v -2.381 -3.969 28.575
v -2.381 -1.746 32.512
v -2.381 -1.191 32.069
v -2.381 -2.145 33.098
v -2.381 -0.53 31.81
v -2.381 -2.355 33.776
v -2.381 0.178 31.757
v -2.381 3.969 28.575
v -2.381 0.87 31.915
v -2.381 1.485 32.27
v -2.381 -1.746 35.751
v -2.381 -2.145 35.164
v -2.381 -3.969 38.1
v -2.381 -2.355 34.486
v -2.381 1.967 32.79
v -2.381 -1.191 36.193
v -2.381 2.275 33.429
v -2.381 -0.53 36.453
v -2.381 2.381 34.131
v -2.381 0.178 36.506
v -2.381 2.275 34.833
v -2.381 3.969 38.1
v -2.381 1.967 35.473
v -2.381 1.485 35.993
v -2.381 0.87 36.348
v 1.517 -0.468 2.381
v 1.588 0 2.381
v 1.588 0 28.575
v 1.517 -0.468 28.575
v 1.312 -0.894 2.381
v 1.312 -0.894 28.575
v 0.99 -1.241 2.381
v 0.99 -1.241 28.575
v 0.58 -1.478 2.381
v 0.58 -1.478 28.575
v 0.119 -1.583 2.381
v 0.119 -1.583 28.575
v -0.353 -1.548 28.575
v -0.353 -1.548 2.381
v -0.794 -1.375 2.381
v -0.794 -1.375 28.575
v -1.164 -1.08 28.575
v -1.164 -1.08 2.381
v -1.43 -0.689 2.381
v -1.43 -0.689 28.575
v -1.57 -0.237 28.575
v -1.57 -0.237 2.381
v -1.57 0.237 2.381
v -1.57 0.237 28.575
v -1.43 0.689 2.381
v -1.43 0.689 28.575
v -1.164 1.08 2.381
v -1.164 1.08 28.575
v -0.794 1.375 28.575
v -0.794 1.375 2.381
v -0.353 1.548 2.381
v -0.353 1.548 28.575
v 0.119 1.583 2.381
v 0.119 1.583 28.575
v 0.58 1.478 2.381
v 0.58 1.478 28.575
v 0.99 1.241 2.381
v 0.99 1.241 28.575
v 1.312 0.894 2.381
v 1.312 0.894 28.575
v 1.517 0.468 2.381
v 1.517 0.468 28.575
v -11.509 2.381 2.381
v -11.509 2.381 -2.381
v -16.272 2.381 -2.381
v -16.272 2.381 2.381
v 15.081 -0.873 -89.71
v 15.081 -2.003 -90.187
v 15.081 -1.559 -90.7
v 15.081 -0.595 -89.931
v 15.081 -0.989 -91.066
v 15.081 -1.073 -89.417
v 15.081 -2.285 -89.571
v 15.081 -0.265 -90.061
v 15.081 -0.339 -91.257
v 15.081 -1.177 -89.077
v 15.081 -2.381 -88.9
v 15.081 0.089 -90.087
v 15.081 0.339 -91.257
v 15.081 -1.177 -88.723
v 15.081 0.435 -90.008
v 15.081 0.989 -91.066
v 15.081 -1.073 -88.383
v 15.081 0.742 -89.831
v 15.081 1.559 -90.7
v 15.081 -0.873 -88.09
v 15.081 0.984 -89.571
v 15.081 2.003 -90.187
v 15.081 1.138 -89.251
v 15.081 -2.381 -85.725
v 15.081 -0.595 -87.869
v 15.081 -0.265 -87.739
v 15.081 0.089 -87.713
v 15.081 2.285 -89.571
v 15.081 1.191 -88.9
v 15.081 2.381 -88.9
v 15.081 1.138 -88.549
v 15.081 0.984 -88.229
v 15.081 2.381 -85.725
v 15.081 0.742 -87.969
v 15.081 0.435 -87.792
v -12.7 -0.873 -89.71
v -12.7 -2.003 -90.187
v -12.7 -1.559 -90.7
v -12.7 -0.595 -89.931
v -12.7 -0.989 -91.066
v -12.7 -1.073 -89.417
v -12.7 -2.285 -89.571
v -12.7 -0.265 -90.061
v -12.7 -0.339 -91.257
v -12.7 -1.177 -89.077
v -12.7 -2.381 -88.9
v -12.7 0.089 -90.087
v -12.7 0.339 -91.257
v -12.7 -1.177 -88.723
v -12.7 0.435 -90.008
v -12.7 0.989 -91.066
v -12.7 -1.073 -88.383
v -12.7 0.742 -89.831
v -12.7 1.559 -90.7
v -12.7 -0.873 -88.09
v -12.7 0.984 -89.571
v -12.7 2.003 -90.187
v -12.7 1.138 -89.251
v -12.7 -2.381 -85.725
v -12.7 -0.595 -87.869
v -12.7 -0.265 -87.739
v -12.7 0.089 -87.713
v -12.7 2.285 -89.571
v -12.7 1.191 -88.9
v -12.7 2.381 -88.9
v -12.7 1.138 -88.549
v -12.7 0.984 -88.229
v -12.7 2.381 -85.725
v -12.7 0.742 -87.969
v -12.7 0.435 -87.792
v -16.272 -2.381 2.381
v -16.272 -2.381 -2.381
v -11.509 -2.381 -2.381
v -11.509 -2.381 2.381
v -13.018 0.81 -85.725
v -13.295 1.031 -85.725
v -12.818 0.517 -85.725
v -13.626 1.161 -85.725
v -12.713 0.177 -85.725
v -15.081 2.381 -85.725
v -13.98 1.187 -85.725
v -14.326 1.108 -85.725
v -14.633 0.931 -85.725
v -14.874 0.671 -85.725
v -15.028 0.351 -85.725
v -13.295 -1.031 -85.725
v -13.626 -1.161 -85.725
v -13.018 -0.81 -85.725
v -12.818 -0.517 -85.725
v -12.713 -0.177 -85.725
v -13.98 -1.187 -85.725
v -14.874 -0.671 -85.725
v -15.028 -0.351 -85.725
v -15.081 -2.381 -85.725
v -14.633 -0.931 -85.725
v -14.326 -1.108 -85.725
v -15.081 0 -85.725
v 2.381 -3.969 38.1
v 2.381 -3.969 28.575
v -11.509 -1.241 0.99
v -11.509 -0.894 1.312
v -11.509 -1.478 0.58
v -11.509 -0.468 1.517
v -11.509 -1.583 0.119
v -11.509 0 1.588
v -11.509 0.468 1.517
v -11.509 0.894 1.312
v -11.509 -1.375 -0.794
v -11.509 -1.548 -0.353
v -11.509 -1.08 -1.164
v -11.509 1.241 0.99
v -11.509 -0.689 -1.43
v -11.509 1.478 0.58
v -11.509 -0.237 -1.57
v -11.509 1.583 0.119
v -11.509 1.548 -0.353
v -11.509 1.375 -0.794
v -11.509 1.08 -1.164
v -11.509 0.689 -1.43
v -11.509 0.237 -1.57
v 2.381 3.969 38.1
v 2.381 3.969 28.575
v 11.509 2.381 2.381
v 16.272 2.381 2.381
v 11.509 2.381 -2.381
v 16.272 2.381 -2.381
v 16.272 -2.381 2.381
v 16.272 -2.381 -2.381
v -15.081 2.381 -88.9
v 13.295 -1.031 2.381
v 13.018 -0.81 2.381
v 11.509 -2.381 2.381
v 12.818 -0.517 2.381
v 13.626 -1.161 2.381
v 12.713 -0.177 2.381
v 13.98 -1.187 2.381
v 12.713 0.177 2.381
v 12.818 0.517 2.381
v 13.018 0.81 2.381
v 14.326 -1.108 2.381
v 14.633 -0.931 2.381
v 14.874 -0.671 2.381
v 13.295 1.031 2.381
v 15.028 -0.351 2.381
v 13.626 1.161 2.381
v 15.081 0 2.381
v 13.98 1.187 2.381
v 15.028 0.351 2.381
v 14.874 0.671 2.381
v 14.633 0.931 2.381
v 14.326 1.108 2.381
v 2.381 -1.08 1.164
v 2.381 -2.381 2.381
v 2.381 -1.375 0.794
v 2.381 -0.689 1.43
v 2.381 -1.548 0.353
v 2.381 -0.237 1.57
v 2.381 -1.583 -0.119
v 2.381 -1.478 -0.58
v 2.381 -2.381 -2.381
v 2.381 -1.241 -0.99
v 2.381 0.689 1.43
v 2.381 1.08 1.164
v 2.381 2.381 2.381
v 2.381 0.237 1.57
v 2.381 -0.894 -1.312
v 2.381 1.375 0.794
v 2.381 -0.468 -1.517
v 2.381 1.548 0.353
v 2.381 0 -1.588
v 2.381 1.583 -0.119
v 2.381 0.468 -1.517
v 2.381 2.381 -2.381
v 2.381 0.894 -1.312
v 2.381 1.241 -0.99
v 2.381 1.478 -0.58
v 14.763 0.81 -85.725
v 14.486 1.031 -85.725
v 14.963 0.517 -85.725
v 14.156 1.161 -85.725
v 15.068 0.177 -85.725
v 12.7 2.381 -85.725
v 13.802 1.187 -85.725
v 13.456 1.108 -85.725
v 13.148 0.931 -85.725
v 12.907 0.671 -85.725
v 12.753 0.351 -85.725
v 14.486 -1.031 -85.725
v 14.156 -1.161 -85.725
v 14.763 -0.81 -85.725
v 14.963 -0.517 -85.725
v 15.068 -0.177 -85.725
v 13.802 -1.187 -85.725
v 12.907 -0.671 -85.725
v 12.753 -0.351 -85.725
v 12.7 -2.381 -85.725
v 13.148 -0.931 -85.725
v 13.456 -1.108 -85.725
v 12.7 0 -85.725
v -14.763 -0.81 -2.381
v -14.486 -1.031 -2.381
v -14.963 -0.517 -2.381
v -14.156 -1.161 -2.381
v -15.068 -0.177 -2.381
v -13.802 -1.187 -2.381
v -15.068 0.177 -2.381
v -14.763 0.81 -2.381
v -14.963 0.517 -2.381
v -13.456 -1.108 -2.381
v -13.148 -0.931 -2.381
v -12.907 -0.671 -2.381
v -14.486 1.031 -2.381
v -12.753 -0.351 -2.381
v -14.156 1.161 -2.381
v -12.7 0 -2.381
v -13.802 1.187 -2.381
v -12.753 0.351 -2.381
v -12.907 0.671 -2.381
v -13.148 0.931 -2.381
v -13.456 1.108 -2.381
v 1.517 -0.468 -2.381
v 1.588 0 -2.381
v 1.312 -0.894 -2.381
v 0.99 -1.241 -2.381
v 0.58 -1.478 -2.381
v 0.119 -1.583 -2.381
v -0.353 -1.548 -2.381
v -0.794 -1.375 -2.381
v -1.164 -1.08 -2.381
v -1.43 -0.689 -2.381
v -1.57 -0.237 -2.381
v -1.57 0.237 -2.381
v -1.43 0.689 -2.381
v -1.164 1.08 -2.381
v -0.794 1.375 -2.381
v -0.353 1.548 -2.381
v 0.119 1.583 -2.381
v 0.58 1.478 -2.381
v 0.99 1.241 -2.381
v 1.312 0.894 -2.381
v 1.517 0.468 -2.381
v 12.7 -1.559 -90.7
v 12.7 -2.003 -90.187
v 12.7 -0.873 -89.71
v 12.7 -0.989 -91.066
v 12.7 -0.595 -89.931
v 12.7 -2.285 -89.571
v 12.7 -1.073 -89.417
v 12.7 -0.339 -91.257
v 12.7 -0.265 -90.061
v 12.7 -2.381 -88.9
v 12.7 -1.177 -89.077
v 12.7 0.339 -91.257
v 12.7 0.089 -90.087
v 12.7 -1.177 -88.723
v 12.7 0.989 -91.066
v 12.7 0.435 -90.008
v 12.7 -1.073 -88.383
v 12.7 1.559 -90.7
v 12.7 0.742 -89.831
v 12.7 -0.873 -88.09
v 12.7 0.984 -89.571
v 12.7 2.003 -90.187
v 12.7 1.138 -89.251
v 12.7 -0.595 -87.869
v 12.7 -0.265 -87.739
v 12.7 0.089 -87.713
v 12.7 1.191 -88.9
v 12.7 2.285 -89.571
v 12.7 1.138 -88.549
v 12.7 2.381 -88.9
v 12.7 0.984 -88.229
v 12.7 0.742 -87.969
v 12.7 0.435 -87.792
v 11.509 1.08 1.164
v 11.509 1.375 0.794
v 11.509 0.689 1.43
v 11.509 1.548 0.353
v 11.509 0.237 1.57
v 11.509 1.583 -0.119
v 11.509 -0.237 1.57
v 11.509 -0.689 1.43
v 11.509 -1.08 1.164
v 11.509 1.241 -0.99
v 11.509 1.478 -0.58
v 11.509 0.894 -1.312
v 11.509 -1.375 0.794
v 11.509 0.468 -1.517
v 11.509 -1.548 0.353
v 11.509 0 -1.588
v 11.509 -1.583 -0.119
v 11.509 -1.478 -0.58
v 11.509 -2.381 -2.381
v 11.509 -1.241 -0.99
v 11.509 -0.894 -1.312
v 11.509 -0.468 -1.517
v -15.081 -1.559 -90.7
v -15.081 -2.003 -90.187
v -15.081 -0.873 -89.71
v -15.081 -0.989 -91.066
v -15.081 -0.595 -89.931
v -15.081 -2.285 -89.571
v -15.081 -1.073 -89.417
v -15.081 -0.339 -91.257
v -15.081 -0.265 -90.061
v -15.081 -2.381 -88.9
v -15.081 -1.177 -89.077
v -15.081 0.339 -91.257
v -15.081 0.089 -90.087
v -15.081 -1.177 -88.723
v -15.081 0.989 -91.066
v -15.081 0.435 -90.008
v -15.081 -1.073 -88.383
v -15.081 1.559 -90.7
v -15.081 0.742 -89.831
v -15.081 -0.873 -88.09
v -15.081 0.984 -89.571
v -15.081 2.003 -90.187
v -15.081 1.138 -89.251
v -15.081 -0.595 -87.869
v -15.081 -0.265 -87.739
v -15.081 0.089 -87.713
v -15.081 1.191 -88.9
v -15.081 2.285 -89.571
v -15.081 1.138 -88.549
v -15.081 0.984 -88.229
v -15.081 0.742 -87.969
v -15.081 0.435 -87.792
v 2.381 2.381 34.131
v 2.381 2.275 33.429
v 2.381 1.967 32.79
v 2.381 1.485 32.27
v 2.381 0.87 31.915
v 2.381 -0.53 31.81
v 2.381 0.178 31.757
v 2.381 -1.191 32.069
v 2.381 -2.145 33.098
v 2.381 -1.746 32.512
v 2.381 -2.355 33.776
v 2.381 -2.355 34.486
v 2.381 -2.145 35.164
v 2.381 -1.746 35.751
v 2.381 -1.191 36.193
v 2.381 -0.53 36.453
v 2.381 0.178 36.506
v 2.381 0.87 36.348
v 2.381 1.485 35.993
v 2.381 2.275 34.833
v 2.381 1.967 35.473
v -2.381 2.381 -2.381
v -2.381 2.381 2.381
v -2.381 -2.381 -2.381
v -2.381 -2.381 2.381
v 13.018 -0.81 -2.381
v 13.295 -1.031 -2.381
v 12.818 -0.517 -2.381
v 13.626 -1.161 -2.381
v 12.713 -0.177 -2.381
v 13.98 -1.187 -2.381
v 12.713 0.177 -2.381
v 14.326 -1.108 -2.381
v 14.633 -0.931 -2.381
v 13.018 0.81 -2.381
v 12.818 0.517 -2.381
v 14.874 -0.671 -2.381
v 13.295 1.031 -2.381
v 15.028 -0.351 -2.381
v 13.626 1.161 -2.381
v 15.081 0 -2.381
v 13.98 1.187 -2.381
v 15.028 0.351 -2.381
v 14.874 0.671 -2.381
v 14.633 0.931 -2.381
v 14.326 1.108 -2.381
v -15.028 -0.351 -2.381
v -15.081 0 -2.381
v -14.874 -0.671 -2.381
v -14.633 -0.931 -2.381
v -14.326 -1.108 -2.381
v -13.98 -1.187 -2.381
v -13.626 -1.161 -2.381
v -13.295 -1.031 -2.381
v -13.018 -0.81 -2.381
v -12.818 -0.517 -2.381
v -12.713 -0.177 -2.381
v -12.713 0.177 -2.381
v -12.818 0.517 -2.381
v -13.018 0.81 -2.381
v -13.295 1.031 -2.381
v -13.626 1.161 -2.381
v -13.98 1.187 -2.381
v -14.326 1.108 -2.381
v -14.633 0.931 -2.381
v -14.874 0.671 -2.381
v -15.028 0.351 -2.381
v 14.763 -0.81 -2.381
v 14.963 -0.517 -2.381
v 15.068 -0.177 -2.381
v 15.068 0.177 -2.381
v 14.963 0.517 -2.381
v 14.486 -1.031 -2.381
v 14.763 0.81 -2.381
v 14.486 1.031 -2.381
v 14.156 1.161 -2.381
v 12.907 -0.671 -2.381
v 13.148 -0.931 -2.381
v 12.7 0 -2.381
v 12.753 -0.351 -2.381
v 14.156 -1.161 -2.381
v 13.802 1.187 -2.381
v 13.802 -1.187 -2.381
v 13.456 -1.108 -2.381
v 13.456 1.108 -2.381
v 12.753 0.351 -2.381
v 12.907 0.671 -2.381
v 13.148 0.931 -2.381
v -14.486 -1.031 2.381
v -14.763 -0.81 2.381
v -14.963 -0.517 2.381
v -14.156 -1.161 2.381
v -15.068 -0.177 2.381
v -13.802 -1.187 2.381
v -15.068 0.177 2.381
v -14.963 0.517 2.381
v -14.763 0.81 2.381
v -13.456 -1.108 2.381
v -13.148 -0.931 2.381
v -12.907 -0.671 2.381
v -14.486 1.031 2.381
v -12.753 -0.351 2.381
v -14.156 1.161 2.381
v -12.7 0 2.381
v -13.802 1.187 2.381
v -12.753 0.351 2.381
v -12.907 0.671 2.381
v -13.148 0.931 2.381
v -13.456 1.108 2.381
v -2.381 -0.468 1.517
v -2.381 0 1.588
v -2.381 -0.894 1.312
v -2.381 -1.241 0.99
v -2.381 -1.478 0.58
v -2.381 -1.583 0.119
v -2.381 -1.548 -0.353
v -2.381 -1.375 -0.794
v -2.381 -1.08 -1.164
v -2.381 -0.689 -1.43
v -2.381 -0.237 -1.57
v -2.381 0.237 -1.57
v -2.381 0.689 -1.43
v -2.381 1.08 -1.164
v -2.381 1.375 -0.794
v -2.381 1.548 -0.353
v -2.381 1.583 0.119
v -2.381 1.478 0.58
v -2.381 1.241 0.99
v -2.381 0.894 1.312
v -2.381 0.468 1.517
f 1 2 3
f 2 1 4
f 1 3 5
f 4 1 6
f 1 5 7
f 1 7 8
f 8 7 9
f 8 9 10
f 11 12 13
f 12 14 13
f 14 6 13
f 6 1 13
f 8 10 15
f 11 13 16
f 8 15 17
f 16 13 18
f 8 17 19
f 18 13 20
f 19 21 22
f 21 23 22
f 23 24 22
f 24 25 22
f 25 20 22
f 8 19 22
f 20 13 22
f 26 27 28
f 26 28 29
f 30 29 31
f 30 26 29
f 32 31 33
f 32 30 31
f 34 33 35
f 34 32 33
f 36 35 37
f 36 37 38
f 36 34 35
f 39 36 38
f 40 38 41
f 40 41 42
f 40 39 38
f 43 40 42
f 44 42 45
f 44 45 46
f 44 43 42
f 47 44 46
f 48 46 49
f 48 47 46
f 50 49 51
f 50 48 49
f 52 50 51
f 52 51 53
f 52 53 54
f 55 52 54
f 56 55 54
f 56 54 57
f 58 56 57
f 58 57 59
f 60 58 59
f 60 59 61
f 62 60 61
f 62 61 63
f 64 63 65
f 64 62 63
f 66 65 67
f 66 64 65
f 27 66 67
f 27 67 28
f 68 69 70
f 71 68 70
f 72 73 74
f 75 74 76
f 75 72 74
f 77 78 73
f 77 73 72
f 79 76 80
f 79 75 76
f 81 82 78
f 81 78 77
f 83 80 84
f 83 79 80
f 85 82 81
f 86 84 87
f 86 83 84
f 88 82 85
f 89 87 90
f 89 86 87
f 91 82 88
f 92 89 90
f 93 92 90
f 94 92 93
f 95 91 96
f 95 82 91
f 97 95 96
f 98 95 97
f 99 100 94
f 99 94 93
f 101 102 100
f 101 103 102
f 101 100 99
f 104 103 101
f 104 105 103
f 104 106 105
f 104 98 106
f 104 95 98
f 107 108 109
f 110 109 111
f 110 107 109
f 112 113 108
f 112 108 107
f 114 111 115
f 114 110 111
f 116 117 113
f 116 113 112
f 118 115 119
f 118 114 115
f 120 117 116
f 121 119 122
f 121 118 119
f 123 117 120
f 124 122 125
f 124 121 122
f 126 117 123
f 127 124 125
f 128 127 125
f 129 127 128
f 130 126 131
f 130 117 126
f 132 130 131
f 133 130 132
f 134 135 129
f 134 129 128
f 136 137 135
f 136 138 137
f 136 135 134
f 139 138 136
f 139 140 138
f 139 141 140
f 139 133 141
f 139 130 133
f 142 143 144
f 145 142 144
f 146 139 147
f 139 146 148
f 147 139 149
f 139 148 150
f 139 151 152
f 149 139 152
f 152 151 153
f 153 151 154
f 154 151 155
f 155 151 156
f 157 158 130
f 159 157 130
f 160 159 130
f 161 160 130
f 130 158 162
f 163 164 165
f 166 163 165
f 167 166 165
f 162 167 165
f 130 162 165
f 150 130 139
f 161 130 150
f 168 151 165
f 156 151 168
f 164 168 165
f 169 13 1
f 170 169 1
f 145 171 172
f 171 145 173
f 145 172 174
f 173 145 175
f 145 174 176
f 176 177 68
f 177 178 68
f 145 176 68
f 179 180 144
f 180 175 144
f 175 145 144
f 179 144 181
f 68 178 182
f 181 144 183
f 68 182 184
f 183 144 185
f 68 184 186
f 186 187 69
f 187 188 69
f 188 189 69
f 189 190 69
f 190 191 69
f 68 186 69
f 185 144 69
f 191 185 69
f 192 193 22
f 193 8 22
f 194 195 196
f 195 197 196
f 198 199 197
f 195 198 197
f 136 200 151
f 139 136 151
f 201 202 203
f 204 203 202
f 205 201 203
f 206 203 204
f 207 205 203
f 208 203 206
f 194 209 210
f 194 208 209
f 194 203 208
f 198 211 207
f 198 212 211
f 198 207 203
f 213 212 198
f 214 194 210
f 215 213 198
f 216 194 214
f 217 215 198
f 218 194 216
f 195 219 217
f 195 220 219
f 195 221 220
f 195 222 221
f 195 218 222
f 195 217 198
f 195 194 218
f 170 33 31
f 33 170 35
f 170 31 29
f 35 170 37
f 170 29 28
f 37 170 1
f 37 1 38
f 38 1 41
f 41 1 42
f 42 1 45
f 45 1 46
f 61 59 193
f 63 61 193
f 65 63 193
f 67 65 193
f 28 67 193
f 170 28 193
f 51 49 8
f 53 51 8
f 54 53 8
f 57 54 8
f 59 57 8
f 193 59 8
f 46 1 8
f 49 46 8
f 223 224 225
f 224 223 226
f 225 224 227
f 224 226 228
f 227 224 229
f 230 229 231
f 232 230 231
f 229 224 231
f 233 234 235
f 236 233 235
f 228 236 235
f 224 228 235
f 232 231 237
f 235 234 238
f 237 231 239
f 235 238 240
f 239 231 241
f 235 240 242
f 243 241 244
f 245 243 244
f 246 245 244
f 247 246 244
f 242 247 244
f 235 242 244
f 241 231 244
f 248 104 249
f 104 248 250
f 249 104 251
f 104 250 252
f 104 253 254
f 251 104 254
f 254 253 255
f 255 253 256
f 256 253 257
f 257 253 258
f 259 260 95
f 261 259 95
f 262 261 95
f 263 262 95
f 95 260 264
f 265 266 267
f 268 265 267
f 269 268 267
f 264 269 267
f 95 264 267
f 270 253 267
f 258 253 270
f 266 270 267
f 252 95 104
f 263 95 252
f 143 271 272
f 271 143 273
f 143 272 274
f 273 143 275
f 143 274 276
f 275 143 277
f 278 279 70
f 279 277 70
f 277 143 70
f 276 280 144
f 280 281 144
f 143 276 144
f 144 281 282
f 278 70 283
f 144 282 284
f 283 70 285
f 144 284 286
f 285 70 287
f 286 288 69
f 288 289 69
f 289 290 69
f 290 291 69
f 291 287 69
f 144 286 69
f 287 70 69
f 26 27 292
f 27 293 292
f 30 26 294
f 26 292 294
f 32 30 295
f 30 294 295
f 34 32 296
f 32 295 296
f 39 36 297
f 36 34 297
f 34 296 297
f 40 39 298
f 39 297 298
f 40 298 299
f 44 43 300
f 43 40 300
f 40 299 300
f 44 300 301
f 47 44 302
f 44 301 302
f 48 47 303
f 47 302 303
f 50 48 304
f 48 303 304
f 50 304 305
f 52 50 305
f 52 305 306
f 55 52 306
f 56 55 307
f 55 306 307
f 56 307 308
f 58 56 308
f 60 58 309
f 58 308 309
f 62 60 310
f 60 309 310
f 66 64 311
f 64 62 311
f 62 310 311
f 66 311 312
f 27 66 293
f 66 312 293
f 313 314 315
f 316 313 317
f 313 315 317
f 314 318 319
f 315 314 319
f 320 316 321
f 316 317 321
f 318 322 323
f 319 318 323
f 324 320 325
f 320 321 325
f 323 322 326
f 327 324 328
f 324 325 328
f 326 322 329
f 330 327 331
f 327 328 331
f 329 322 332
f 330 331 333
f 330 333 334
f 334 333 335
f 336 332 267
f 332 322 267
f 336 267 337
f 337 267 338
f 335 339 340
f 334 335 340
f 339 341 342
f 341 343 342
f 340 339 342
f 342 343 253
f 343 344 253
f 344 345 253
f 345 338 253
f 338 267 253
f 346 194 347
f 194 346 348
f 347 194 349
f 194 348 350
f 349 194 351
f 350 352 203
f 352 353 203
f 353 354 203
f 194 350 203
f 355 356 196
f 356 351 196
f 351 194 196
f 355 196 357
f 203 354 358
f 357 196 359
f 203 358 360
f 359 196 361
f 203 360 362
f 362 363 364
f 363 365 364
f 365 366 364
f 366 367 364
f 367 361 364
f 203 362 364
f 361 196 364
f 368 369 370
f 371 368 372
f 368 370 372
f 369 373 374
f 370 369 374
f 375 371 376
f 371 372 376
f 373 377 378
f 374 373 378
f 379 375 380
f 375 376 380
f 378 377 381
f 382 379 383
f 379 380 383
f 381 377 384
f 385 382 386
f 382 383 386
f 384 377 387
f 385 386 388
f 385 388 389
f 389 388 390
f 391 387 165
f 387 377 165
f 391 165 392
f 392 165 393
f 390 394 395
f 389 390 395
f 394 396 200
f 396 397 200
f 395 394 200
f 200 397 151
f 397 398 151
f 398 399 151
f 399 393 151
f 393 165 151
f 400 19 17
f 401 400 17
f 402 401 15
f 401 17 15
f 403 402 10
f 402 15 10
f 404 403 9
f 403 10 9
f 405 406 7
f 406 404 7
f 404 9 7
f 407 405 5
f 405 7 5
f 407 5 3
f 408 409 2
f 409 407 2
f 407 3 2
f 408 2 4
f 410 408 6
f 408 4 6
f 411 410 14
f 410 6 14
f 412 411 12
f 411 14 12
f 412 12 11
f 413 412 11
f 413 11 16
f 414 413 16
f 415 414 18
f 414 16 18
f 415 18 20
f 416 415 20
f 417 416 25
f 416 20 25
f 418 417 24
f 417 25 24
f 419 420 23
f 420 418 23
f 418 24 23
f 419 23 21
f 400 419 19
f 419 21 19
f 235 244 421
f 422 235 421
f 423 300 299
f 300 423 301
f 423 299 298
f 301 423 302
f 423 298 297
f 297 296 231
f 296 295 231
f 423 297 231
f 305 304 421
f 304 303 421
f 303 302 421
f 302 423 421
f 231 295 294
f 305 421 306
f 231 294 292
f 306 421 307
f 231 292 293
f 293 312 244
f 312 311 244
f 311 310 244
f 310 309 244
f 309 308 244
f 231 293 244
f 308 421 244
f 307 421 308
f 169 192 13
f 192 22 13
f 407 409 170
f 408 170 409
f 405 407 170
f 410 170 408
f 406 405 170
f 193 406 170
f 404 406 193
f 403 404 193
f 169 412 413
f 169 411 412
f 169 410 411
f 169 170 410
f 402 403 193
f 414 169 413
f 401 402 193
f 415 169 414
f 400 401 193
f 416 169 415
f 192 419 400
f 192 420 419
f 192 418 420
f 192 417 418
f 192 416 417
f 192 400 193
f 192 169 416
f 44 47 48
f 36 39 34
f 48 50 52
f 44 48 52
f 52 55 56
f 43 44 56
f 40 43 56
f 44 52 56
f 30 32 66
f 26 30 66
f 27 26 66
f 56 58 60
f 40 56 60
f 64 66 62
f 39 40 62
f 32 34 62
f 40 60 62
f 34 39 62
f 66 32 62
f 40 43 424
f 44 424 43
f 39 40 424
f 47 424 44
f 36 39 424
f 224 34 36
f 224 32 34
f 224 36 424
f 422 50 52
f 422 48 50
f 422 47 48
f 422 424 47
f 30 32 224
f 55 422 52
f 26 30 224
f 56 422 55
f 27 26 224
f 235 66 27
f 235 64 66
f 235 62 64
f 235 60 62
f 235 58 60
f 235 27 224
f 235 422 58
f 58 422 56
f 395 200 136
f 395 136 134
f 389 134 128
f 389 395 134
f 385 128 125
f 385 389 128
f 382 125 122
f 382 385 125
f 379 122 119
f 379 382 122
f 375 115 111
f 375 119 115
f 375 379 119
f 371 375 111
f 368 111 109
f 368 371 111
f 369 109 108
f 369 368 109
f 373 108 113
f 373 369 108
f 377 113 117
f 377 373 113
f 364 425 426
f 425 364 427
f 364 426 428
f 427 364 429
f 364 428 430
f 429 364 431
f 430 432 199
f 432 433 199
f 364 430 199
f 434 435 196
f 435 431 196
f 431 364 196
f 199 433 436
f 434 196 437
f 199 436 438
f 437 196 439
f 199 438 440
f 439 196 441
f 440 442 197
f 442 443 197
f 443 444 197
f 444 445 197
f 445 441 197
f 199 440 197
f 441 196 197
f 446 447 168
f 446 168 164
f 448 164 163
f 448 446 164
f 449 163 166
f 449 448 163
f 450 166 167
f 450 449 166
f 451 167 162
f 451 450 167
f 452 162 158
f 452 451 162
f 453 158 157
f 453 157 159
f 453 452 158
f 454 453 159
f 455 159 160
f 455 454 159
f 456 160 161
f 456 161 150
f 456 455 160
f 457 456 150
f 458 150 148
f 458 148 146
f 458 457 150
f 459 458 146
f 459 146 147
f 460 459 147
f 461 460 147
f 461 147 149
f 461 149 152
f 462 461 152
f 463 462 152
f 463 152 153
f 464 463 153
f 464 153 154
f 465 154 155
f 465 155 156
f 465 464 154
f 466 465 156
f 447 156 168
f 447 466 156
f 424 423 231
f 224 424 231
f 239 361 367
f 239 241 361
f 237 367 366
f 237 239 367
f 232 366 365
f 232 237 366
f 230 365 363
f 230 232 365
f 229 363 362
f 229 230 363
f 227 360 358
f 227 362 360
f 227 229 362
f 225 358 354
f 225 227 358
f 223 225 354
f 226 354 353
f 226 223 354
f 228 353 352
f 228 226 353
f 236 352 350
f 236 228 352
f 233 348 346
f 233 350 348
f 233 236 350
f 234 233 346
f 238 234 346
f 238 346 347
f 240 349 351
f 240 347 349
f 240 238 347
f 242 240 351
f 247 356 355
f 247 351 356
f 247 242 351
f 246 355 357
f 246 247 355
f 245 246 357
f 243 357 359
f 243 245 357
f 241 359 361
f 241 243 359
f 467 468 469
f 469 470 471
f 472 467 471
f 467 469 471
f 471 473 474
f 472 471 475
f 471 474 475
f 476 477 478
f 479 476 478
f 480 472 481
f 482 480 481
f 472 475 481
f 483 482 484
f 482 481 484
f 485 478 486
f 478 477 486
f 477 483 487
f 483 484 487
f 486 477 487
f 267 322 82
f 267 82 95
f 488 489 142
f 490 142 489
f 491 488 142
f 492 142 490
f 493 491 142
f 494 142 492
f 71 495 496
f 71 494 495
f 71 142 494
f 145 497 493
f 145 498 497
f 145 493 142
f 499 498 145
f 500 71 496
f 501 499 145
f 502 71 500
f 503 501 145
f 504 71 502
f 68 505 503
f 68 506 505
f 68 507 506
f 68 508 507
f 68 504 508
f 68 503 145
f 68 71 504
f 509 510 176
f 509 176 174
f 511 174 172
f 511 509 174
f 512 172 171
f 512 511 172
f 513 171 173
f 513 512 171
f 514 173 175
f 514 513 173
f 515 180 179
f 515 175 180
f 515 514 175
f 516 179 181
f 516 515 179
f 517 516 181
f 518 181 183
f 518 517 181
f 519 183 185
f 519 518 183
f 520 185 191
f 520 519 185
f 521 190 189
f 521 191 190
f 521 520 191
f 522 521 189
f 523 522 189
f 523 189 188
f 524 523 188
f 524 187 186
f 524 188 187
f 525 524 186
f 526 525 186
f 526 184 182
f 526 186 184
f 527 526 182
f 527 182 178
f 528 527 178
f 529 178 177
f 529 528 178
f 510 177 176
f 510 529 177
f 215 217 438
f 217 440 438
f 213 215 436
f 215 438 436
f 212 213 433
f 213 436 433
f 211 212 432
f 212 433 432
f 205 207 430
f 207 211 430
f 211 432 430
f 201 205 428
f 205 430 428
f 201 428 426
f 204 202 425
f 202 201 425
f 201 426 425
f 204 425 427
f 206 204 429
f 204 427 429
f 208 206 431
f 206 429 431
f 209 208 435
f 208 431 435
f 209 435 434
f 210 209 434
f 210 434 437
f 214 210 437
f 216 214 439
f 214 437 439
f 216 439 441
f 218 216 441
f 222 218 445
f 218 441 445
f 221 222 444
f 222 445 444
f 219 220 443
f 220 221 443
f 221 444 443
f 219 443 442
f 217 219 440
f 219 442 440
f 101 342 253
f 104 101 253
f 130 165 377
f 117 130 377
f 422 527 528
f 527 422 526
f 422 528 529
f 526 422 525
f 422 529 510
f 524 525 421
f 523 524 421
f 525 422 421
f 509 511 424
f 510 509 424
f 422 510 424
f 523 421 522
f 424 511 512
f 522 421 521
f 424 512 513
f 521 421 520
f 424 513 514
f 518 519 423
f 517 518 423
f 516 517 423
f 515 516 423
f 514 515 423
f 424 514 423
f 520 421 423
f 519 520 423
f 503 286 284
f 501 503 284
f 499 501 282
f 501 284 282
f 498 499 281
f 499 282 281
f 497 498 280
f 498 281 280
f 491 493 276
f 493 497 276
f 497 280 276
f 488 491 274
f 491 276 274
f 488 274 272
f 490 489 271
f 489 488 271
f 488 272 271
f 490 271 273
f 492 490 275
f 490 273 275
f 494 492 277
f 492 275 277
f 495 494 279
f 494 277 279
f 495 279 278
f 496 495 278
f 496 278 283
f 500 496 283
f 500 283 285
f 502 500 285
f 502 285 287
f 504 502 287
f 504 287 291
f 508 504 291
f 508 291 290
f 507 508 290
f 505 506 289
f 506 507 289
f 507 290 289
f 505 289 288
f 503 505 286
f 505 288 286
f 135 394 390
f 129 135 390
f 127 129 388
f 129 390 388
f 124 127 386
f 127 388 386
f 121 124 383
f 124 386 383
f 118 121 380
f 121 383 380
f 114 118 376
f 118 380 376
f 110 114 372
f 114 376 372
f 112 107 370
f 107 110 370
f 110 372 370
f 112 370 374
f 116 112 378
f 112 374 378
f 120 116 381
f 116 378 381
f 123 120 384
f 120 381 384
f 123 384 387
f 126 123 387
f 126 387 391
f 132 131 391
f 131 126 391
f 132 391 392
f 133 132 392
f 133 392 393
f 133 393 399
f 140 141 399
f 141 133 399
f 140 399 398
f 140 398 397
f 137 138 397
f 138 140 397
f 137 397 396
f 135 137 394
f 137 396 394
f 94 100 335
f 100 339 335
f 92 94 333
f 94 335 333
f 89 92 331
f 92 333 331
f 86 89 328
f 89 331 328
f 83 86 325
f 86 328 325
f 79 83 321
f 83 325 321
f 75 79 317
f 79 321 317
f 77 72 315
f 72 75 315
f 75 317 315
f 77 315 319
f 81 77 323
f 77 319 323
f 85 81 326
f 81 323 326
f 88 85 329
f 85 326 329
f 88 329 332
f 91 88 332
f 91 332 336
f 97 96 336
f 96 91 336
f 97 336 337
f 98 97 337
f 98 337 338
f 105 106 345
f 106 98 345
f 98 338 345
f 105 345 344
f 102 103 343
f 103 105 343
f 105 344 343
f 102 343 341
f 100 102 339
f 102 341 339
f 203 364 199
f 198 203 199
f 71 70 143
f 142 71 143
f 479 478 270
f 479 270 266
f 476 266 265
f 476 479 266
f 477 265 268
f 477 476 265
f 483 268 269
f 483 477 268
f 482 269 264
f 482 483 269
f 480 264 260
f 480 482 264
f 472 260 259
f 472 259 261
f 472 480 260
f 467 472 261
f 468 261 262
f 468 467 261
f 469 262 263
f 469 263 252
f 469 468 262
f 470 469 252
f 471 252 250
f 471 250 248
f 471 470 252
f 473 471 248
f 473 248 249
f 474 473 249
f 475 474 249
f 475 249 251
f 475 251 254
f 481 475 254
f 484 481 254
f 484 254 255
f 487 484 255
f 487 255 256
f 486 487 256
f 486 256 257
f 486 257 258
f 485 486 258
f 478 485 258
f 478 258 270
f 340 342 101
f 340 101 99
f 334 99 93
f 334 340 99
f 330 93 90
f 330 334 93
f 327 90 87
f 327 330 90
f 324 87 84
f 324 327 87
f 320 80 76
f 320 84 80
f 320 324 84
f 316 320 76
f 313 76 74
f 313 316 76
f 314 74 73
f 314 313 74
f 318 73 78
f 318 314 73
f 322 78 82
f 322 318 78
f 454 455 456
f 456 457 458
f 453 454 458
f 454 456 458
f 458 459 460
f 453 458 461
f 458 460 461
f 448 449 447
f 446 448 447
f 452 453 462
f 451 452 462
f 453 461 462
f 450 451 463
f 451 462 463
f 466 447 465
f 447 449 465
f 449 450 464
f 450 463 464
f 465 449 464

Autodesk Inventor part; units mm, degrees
ref_plane "XZ Plane" through (0, 0, 0) normal (0, 1, 0) x (-1, 0, 0)
sketch "Boceto1" plane through (0, 0, 0) normal (0, 0, 1) x (1, 0, 0)
  line L0 (-2.3813, -2.3813) -> (2.3813, -2.3813)
  line L1 (2.3813, -2.3813) -> (2.3813, 2.3813)
  line L2 (2.3813, 2.3813) -> (-2.3813, 2.3813)
  line L3 (-2.3813, 2.3813) -> (-2.3813, -2.3813)
  line L4 (-2.3813, -2.3813) -> (2.3813, 2.3813) construction
  line L5 (2.3813, -2.3813) -> (-2.3813, 2.3813) construction
  circle A0 centre (0, 0) radius 1.5875
  dimension "d0" = 4.7625
  dimension "d1" = 4.7625
  dimension "d2" = 3.175
extrude "Extrusión1" add sketch "Boceto1" along normal mid plane 4.7625
sketch "Boceto2" plane through (2.3813, -2.3813, 2.3813) normal (1, 0, 0) x (0, 0, -1)
  circle A0 centre (2.3813, 2.3813) radius 1.5875
  dimension "d5" = 3.175
extrude "Extrusión2" add sketch "Boceto2" along normal blind 9.1281
sketch "Boceto3" plane through (-2.3813, -2.3813, 2.3813) normal (-1, 0, 0) x (0, 0, 1)
  circle A0 centre (-2.3813, 2.3813) radius 1.5875
  dimension "d8" = 3.175
extrude "Extrusión3" add sketch "Boceto3" along normal blind 9.1281
sketch "Boceto4" plane through (0, 0, 0) normal (0, 0, 1) x (1, 0, 0)
  line L0 (-16.2719, -2.3812) -> (-11.5094, -2.3812)
  line L1 (-11.5094, -2.3812) -> (-11.5094, 2.3813)
  line L2 (-11.5094, 2.3813) -> (-16.2719, 2.3813)
  line L3 (-16.2719, 2.3813) -> (-16.2719, -2.3812)
  line L4 (-16.2719, -2.3812) -> (-11.5094, 2.3813) construction
  line L5 (-11.5094, -2.3812) -> (-16.2719, 2.3813) construction
  line L6 (11.5094, -2.3812) -> (16.2719, -2.3812)
  line L7 (16.2719, -2.3812) -> (16.2719, 2.3813)
  line L8 (16.2719, 2.3813) -> (11.5094, 2.3813)
  line L9 (11.5094, 2.3813) -> (11.5094, -2.3812)
  line L10 (11.5094, -2.3812) -> (16.2719, 2.3813) construction
  line L11 (16.2719, -2.3812) -> (11.5094, 2.3813) construction
  circle A0 centre (-13.8906, 0) radius 1.1906
  circle A1 centre (13.8906, 0) radius 1.1906
  point P0 (0, 0)
  dimension "d11" = 4.7625
  dimension "d12" = 4.7625
  dimension "d13" = 4.7625
  dimension "d14" = 4.7625
  dimension "d15" = 13.8906
  dimension "d16" = 13.8906
  dimension "d17" = 2.3813
  dimension "d18" = 2.3813
extrude "Extrusión4" add sketch "Boceto4" along normal mid plane 4.7625
sketch "Boceto5" plane through (0, 0, 2.3813) normal (0, 0, 1) x (1, 0, 0)
  circle A0 centre (0, 0) radius 1.5875
extrude "Extrusión5" add sketch "Boceto5" along normal blind 26.1938
sketch "Boceto6" plane through (0, 0, 0) normal (1, 0, 0) x (0, 1, 0)
  line L0 (-3.9687, 28.575) -> (3.9687, 28.575)
  line L1 (3.9687, 28.575) -> (3.9687, 38.1)
  line L2 (3.9687, 38.1) -> (-3.9688, 38.1)
  line L3 (-3.9688, 38.1) -> (-3.9687, 28.575)
  line L4 (-3.9687, 28.575) -> (3.9687, 38.1) construction
  line L5 (3.9687, 28.575) -> (-3.9688, 38.1) construction
  line L6 (2.3812, 2.3813) -> (-2.3812, 2.3813) projected
  circle A0 centre (0, 34.1313) radius 2.3812
  point P0 (0, 0)
  point P1 (0, 33.3375)
  dimension "d23" = 7.9375
  dimension "d24" = 9.525
  dimension "d25" = 30.9563
  dimension "d26" = 4.7625
  dimension "d27" = 3.9688
extrude "Extrusión6" add sketch "Boceto6" along normal mid plane 4.7625
sketch "Boceto7" plane through (0, 0, -2.3813) normal (0, 0, -1) x (-1, 0, 0)
  circle A0 centre (13.8906, 0) radius 1.1906 construction
  circle A1 centre (-13.8906, 0) radius 1.1906 construction
  circle A2 centre (-13.8906, 0) radius 1.1906
  circle A3 centre (13.8906, 0) radius 1.1906
  point P0 (0, 0)
extrude "Extrusión7" add sketch "Boceto7" along normal blind 83.3438
ref_plane "Plano de trabajo1" through (13.8906, 0, 0) normal (1, 0, 0) x (0, 1, 0)
sketch "Boceto8" plane through (13.8906, 0, 0) normal (1, 0, 0) x (0, 1, 0)
  arc A0 (-2.3813, -88.9) -> (2.3813, -88.9) centre (0, -88.9) ccw
  line L0 (2.3813, -88.9) -> (2.3813, -85.725)
  line L1 (-2.3813, -88.9) -> (-2.3813, -85.725)
  line L2 (-1.1906, -85.725) -> (1.1906, -85.725) construction
  line L3 (2.3813, -85.725) -> (-2.3813, -85.725)
  circle A1 centre (0, -88.9) radius 1.1906
  point P0 (0, 0)
  dimension "d33" = 4.7625
  dimension "d34" = 88.9
  dimension "d35" = 2.3813
extrude "Extrusión8" add sketch "Boceto8" along normal mid plane 2.3813
ref_plane "Plano de trabajo2" through (-13.8906, 0, 0) normal (1, 0, 0) x (0, 1, 0)
sketch "Boceto9" plane through (-13.8906, 0, 0) normal (1, 0, 0) x (0, 1, 0)
  arc A0 (-2.3813, -88.9) -> (2.3813, -88.9) centre (0, -88.9) ccw construction
  line L0 (2.3813, -85.725) -> (2.3813, -88.9) construction
  line L1 (0, -85.725) -> (2.3813, -85.725) construction
  line L2 (-2.3813, -85.725) -> (0, -85.725) construction
  line L3 (0, -85.725) -> (2.3813, -85.725) construction
  line L4 (2.3813, -85.725) -> (2.3813, -88.9) construction
  arc A1 (-2.3813, -88.9) -> (2.3813, -88.9) centre (0, -88.9) ccw construction
  line L5 (-2.3813, -88.9) -> (-2.3813, -85.725) construction
  circle A2 centre (0, -88.9) radius 1.1906 construction
  arc A3 (-2.3813, -88.9) -> (2.3813, -88.9) centre (0, -88.9) ccw
  line L6 (2.3813, -88.9) -> (2.3813, -85.725) projected
  line L7 (2.3813, -88.9) -> (2.3813, -85.725)
  line L8 (2.3813, -85.725) -> (-2.3813, -85.725)
  line L9 (-2.3813, -85.725) -> (-2.3813, -88.9) projected
  line L10 (-2.3813, -85.725) -> (-2.3813, -88.9)
  circle A4 centre (0, -88.9) radius 1.1906
  point P0 (0, 0)
extrude "Extrusión9" add sketch "Boceto9" along normal mid plane 2.3813
equation "\"d16\" = d15"
properties part number "connectingRod2"
